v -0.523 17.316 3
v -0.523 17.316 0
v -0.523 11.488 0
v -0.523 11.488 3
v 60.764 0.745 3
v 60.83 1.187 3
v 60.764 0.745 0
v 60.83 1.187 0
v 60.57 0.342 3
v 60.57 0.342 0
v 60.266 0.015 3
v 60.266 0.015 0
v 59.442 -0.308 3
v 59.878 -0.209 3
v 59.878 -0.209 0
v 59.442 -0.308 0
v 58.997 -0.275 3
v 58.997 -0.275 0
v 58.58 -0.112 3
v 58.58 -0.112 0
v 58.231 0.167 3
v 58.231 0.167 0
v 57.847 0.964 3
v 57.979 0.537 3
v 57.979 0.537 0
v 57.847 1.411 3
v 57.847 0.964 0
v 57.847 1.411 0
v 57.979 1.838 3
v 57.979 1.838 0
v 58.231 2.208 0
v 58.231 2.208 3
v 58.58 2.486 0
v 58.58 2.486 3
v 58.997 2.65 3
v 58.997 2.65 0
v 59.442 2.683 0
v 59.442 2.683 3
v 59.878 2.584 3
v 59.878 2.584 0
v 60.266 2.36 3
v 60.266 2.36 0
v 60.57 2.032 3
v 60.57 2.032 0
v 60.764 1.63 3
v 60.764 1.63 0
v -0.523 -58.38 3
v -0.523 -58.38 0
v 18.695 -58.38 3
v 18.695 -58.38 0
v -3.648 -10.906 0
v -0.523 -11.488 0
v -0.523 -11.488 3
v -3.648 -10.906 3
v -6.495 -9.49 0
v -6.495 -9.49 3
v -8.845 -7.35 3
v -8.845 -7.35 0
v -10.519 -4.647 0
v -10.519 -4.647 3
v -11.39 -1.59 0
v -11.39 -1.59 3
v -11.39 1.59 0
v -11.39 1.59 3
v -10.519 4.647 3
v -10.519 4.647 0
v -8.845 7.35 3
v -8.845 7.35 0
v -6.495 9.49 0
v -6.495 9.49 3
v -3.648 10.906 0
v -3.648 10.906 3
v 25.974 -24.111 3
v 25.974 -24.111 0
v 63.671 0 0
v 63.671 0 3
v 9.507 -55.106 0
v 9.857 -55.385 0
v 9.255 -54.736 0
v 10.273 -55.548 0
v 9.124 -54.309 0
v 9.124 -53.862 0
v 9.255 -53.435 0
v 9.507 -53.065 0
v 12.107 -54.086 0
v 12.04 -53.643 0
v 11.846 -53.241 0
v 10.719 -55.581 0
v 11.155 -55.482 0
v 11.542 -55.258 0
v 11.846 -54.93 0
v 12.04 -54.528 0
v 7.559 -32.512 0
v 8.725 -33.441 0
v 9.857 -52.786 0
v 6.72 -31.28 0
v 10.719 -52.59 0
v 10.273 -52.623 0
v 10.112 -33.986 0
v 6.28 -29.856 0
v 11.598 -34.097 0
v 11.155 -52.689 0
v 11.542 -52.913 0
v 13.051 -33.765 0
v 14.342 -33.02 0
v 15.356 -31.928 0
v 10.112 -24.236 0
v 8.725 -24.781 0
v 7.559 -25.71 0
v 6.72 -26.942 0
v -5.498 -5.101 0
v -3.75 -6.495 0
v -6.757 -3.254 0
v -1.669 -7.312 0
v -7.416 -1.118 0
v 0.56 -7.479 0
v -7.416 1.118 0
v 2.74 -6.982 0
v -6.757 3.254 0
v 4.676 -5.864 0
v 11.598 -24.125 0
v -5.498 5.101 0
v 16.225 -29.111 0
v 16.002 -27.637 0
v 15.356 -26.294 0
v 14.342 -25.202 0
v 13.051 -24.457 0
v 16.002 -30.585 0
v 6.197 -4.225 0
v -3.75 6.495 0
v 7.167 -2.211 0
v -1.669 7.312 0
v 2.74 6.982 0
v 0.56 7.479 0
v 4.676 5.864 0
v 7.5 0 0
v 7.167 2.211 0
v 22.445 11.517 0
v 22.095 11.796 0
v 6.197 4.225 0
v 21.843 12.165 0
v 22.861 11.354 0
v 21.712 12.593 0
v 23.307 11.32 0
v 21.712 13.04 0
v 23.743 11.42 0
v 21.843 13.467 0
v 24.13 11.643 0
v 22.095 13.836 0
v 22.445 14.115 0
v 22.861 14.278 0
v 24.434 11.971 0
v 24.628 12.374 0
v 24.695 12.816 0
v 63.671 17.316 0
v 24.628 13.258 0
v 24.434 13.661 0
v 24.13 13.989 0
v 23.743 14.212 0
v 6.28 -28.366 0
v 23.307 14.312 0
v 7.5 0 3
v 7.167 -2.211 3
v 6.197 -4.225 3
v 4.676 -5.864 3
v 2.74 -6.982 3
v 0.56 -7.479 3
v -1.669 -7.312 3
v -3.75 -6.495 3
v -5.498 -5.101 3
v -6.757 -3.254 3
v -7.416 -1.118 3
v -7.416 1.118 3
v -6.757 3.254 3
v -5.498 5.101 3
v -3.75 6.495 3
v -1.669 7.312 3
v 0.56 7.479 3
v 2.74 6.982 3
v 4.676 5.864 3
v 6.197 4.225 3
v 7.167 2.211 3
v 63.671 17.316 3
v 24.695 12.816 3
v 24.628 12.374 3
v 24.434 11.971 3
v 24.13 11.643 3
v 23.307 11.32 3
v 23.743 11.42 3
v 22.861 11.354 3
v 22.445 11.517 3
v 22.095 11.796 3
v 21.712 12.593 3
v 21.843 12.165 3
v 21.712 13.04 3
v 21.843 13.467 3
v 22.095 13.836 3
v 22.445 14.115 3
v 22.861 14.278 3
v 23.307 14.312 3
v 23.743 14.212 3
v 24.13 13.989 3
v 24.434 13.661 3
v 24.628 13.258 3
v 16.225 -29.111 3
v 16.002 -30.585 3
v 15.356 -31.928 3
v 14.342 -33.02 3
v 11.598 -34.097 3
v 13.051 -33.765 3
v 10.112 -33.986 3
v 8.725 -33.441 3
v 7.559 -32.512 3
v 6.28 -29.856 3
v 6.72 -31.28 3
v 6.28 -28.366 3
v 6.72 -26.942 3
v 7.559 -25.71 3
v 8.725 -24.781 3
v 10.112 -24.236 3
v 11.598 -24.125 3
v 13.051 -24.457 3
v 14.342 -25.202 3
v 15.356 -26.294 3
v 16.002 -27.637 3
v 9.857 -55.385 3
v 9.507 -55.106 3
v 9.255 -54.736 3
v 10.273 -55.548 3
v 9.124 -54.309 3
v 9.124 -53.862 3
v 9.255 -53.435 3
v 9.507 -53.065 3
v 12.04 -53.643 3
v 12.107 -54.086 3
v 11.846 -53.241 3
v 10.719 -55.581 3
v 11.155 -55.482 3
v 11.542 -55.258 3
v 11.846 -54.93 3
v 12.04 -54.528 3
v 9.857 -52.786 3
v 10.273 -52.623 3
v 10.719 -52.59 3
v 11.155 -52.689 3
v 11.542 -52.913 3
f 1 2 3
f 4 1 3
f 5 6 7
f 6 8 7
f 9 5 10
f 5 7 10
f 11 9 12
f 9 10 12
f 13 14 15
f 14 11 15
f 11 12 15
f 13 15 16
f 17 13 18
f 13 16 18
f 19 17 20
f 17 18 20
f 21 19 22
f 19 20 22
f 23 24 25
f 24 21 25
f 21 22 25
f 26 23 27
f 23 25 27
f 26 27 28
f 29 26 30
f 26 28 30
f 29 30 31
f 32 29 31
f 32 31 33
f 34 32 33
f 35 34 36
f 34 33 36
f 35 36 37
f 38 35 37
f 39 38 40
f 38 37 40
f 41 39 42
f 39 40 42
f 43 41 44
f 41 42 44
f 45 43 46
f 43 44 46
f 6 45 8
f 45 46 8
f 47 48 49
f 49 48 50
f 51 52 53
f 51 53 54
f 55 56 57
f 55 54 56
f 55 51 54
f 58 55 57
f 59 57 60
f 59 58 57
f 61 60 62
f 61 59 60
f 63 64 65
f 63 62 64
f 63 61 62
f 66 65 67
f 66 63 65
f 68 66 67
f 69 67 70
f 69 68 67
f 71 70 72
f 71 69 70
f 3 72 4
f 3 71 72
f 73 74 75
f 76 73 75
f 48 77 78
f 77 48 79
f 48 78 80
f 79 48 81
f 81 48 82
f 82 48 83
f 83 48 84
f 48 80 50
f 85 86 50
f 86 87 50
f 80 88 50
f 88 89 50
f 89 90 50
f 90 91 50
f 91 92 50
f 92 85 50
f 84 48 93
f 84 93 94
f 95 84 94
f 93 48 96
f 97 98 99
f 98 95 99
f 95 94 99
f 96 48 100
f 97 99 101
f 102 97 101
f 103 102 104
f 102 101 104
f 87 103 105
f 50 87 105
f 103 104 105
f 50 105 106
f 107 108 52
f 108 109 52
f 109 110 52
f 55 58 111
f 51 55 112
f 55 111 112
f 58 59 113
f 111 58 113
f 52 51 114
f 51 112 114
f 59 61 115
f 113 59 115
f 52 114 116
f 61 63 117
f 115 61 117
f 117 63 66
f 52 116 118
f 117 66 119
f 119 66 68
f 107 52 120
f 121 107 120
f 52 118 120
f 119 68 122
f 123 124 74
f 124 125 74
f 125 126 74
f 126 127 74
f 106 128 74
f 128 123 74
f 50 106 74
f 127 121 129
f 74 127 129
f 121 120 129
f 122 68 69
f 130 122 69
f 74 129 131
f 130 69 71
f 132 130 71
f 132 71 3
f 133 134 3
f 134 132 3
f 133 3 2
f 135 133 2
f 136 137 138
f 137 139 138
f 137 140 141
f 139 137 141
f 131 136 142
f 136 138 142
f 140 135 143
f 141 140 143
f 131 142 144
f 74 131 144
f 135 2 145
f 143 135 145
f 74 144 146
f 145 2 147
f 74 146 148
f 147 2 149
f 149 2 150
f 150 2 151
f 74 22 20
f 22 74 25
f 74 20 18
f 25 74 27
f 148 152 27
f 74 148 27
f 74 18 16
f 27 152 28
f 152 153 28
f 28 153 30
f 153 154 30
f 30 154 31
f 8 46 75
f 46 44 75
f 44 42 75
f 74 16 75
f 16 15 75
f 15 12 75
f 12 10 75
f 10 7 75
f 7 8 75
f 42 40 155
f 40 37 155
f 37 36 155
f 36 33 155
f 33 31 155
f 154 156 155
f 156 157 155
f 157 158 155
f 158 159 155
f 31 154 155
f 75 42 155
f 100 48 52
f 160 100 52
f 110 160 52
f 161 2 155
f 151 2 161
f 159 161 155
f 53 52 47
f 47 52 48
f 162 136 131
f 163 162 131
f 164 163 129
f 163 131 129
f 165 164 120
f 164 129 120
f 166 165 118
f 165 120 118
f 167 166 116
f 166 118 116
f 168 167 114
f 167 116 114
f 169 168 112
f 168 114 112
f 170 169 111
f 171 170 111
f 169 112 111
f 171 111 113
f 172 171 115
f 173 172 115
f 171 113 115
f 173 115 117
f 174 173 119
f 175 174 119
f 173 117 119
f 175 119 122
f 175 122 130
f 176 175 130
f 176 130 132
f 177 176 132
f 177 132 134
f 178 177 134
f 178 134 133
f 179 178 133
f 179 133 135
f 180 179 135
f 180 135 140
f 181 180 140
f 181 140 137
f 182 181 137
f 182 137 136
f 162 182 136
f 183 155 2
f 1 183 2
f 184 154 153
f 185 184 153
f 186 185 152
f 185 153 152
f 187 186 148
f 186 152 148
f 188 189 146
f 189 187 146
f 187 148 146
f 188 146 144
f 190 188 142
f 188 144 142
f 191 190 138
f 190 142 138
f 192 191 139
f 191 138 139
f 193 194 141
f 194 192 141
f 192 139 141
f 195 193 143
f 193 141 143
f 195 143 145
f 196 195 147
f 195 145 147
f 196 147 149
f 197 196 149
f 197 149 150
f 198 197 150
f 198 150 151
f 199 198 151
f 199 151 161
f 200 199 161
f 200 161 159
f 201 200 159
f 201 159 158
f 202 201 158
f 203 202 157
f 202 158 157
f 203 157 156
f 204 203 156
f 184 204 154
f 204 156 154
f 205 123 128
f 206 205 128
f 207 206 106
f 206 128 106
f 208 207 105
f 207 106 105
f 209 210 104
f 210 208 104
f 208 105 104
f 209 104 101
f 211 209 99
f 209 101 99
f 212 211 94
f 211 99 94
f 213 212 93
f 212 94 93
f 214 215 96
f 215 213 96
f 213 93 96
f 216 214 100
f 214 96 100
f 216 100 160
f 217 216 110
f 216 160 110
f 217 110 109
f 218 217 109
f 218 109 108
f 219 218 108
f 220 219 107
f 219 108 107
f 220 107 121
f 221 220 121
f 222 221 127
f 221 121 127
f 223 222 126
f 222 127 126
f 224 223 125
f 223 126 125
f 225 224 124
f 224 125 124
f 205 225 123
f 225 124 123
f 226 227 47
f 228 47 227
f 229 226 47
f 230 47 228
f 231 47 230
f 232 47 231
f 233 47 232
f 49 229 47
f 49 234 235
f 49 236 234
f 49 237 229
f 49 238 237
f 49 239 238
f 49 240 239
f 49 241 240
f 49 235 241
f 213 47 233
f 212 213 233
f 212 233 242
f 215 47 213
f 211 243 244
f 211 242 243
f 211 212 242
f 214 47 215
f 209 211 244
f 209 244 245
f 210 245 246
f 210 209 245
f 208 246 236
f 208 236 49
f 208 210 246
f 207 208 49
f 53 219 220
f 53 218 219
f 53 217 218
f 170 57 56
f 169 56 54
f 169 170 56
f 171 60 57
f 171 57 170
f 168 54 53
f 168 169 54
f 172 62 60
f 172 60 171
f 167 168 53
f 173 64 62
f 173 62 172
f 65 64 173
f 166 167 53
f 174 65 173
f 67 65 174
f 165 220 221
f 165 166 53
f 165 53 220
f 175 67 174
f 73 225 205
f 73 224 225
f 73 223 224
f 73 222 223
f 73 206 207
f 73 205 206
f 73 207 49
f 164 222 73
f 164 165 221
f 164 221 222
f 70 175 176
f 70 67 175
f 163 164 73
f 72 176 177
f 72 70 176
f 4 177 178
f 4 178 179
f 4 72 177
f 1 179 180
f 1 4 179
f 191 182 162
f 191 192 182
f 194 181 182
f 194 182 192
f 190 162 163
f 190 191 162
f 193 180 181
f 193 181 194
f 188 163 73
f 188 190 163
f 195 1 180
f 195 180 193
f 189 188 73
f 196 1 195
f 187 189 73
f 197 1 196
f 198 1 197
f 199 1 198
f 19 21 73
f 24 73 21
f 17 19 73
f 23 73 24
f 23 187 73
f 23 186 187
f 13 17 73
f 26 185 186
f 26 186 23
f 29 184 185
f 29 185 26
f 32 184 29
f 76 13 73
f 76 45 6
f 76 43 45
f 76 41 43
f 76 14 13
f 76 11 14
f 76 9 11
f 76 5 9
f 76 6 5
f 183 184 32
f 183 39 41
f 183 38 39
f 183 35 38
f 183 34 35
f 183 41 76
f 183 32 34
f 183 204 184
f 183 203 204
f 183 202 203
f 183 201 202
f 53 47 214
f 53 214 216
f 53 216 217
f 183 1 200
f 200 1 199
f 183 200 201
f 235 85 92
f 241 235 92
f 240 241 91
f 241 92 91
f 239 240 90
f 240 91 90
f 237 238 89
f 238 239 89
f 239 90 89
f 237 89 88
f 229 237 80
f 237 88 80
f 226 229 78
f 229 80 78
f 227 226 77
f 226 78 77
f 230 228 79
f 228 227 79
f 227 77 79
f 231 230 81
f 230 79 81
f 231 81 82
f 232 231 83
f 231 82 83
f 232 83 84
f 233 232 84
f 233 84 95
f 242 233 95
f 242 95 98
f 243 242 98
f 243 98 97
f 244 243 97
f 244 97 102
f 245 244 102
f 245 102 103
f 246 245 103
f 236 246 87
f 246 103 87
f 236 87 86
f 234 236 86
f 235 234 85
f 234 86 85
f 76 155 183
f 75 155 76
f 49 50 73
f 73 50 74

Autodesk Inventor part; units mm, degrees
ref_plane "YZ Plane" through (0, 0, 0) normal (1, 0, 0) x (0, 1, 0)
ref_plane "XZ Plane" through (0, 0, 0) normal (0, 1, 0) x (-1, 0, 0)
ref_plane "XY Plane" through (0, 0, 0) normal (0, 0, 1) x (1, 0, 0)
sketch "ギア線図" plane through (0, 0, 0) normal (0, 0, 1) x (1, 0, 0)
  circle A0 centre (11.2246, -29.111) radius 11.1
  circle A1 centre (54.3074, -26.8895) radius 20.05
  circle A2 centre (54.3074, -26.8895) radius 4.55
  circle A3 centre (35.8191, -9.9133) radius 11.1
  circle A4 centre (39.3074, -43.38) radius 2.05
  circle A5 centre (69.3074, -43.38) radius 2.05
  circle A6 centre (72.141, -13.5141) radius 2.05
  circle A7 centre (39.3074, -43.38) radius 15
  circle A8 centre (69.3074, -43.38) radius 15
  circle A9 centre (72.141, -13.5141) radius 15
  circle A10 centre (54.3074, -26.8895) radius 5.5 construction
  circle A11 centre (11.2246, -29.111) radius 13 construction
  circle A12 centre (54.3074, -26.8895) radius 20.5 construction
  circle A13 centre (35.8191, -9.9133) radius 20.55
  circle A14 centre (35.8191, -9.9133) radius 21.5 construction
  circle A15 centre (35.8191, -9.9133) radius 13 construction
  circle A16 centre (39.3074, -43.38) radius 2.5 construction
  circle A17 centre (69.3074, -43.38) radius 2.5 construction
  circle A18 centre (72.141, -13.5141) radius 2.5 construction
  circle A19 centre (11.2246, -29.111) radius 20.1
  circle A20 centre (11.2246, -29.111) radius 22 construction
  line L0 (39.3074, -43.38) -> (69.3074, -43.38)
  circle A21 centre (0, 0) radius 20.1
  circle A22 centre (0, 0) radius 22 construction
  circle A23 centre (39.3074, -43.38) radius 9.5 construction
  circle A24 centre (69.3074, -43.38) radius 9.5 construction
  circle A25 centre (72.141, -13.5141) radius 9.5 construction
  point P0 (58.2233, -20.0465)
  point P1 (42.0436, -35)
  point P2 (21.5995, 15.2696)
  point P3 (38.2329, 5.9161)
  point P4 (24.1755, 8.4229)
  point P5 (21.6039, 15.1272)
  point P6 (23.3458, 16.3469)
  point P7 (23.3177, 16.3886)
  dimension "d7" = 22.2
  dimension "d8" = 40.1
  dimension "d9" = 9.1
  dimension "d11" = 22.2
  dimension "d12" = 4.1
  dimension "d13" = 4.1
  dimension "d14" = 4.1
  dimension "d15" = 30
  dimension "d16" = 30
  dimension "d17" = 30
  dimension "d18" = 11
  dimension "d21" = 26
  dimension "d29" = 41
  dimension "d39" = 22.2921
  dimension "d40" = 22.2921
  dimension "d41" = 22.2921
  dimension "d43" = 41.1
  dimension "d44" = 43
  dimension "d45" = 26
  dimension "d46" = 5
  dimension "d47" = 5
  dimension "d48" = 5
  dimension "d49" = 40.2
  dimension "d50" = 44
  dimension "d53" = 40.2
  dimension "d55" = 44
  dimension "d58" = 19
  dimension "d59" = 19
  dimension "d60" = 19
sketch "スケッチ3" plane through (0, 0, 0) normal (0, 0, 1) x (1, 0, 0)
  circle A0 centre (11.2246, -29.111) radius 20.1 construction
  circle A1 centre (39.3074, -43.38) radius 15 construction
  circle A2 centre (69.3074, -43.38) radius 15 construction
  circle A3 centre (72.141, -13.5141) radius 15 construction
  circle A4 centre (11.2246, -29.111) radius 5
  circle A5 centre (59.3303, 1.1874) radius 1.5
  circle A6 centre (23.1948, 12.8161) radius 1.5
  circle A7 centre (10.6068, -54.0855) radius 1.5
  circle A8 centre (59.3303, 1.1874) radius 4.5 construction
  circle A9 centre (35.8191, -9.9133) radius 21.5 construction
  circle A10 centre (23.1948, 12.8161) radius 4.5 construction
  circle A11 centre (0, 0) radius 22 construction
  line L0 (18.6948, -58.38) -> (25.9736, -24.111)
  line L1 (25.9736, -24.111) -> (63.6708, 0)
  line L2 (63.6708, 17.3161) -> (-0.523, 17.3161)
  line L3 (-0.523, 17.3161) -> (-0.523, -58.38)
  line L4 (-0.523, -58.38) -> (18.6948, -58.38)
  line L5 (63.6708, 17.3161) -> (63.6708, 0)
  circle A12 centre (0, 0) radius 7.5
  circle A13 centre (0, 0) radius 11.5
  point P0 (-0.523, -11.4881)
  point P1 (-0.523, 11.4881)
  dimension "d69" = 9
  dimension "d61" = 10
  dimension "d63" = 3
  dimension "d64" = 3
  dimension "d67" = 3
  dimension "d70" = 9
  dimension "d71" = 15
  dimension "d72" = 4
extrude "押し出し1" add sketch "スケッチ3" along normal blind 3 contours L4 L3 A13 L2 L5 L1 L0 | A13 L3 A12 | L3 A12 A13
sketch "スケッチ4" plane through (0, 0, 3) normal (0, 0, 1) x (1, 0, 0)
  circle A0 centre (23.1948, 12.8161) radius 1.5 projected
  circle A1 centre (59.3303, 1.1874) radius 1.5 projected
  circle A2 centre (11.2246, -29.111) radius 5 projected
  circle A3 centre (10.6068, -54.0855) radius 1.5 projected
  point P0 (0, 0)
equation "\"d40\" = d39"
equation "\"d41\" = d40"
properties part number "アームフレーム" material "アルミニウム 2014-T4"
